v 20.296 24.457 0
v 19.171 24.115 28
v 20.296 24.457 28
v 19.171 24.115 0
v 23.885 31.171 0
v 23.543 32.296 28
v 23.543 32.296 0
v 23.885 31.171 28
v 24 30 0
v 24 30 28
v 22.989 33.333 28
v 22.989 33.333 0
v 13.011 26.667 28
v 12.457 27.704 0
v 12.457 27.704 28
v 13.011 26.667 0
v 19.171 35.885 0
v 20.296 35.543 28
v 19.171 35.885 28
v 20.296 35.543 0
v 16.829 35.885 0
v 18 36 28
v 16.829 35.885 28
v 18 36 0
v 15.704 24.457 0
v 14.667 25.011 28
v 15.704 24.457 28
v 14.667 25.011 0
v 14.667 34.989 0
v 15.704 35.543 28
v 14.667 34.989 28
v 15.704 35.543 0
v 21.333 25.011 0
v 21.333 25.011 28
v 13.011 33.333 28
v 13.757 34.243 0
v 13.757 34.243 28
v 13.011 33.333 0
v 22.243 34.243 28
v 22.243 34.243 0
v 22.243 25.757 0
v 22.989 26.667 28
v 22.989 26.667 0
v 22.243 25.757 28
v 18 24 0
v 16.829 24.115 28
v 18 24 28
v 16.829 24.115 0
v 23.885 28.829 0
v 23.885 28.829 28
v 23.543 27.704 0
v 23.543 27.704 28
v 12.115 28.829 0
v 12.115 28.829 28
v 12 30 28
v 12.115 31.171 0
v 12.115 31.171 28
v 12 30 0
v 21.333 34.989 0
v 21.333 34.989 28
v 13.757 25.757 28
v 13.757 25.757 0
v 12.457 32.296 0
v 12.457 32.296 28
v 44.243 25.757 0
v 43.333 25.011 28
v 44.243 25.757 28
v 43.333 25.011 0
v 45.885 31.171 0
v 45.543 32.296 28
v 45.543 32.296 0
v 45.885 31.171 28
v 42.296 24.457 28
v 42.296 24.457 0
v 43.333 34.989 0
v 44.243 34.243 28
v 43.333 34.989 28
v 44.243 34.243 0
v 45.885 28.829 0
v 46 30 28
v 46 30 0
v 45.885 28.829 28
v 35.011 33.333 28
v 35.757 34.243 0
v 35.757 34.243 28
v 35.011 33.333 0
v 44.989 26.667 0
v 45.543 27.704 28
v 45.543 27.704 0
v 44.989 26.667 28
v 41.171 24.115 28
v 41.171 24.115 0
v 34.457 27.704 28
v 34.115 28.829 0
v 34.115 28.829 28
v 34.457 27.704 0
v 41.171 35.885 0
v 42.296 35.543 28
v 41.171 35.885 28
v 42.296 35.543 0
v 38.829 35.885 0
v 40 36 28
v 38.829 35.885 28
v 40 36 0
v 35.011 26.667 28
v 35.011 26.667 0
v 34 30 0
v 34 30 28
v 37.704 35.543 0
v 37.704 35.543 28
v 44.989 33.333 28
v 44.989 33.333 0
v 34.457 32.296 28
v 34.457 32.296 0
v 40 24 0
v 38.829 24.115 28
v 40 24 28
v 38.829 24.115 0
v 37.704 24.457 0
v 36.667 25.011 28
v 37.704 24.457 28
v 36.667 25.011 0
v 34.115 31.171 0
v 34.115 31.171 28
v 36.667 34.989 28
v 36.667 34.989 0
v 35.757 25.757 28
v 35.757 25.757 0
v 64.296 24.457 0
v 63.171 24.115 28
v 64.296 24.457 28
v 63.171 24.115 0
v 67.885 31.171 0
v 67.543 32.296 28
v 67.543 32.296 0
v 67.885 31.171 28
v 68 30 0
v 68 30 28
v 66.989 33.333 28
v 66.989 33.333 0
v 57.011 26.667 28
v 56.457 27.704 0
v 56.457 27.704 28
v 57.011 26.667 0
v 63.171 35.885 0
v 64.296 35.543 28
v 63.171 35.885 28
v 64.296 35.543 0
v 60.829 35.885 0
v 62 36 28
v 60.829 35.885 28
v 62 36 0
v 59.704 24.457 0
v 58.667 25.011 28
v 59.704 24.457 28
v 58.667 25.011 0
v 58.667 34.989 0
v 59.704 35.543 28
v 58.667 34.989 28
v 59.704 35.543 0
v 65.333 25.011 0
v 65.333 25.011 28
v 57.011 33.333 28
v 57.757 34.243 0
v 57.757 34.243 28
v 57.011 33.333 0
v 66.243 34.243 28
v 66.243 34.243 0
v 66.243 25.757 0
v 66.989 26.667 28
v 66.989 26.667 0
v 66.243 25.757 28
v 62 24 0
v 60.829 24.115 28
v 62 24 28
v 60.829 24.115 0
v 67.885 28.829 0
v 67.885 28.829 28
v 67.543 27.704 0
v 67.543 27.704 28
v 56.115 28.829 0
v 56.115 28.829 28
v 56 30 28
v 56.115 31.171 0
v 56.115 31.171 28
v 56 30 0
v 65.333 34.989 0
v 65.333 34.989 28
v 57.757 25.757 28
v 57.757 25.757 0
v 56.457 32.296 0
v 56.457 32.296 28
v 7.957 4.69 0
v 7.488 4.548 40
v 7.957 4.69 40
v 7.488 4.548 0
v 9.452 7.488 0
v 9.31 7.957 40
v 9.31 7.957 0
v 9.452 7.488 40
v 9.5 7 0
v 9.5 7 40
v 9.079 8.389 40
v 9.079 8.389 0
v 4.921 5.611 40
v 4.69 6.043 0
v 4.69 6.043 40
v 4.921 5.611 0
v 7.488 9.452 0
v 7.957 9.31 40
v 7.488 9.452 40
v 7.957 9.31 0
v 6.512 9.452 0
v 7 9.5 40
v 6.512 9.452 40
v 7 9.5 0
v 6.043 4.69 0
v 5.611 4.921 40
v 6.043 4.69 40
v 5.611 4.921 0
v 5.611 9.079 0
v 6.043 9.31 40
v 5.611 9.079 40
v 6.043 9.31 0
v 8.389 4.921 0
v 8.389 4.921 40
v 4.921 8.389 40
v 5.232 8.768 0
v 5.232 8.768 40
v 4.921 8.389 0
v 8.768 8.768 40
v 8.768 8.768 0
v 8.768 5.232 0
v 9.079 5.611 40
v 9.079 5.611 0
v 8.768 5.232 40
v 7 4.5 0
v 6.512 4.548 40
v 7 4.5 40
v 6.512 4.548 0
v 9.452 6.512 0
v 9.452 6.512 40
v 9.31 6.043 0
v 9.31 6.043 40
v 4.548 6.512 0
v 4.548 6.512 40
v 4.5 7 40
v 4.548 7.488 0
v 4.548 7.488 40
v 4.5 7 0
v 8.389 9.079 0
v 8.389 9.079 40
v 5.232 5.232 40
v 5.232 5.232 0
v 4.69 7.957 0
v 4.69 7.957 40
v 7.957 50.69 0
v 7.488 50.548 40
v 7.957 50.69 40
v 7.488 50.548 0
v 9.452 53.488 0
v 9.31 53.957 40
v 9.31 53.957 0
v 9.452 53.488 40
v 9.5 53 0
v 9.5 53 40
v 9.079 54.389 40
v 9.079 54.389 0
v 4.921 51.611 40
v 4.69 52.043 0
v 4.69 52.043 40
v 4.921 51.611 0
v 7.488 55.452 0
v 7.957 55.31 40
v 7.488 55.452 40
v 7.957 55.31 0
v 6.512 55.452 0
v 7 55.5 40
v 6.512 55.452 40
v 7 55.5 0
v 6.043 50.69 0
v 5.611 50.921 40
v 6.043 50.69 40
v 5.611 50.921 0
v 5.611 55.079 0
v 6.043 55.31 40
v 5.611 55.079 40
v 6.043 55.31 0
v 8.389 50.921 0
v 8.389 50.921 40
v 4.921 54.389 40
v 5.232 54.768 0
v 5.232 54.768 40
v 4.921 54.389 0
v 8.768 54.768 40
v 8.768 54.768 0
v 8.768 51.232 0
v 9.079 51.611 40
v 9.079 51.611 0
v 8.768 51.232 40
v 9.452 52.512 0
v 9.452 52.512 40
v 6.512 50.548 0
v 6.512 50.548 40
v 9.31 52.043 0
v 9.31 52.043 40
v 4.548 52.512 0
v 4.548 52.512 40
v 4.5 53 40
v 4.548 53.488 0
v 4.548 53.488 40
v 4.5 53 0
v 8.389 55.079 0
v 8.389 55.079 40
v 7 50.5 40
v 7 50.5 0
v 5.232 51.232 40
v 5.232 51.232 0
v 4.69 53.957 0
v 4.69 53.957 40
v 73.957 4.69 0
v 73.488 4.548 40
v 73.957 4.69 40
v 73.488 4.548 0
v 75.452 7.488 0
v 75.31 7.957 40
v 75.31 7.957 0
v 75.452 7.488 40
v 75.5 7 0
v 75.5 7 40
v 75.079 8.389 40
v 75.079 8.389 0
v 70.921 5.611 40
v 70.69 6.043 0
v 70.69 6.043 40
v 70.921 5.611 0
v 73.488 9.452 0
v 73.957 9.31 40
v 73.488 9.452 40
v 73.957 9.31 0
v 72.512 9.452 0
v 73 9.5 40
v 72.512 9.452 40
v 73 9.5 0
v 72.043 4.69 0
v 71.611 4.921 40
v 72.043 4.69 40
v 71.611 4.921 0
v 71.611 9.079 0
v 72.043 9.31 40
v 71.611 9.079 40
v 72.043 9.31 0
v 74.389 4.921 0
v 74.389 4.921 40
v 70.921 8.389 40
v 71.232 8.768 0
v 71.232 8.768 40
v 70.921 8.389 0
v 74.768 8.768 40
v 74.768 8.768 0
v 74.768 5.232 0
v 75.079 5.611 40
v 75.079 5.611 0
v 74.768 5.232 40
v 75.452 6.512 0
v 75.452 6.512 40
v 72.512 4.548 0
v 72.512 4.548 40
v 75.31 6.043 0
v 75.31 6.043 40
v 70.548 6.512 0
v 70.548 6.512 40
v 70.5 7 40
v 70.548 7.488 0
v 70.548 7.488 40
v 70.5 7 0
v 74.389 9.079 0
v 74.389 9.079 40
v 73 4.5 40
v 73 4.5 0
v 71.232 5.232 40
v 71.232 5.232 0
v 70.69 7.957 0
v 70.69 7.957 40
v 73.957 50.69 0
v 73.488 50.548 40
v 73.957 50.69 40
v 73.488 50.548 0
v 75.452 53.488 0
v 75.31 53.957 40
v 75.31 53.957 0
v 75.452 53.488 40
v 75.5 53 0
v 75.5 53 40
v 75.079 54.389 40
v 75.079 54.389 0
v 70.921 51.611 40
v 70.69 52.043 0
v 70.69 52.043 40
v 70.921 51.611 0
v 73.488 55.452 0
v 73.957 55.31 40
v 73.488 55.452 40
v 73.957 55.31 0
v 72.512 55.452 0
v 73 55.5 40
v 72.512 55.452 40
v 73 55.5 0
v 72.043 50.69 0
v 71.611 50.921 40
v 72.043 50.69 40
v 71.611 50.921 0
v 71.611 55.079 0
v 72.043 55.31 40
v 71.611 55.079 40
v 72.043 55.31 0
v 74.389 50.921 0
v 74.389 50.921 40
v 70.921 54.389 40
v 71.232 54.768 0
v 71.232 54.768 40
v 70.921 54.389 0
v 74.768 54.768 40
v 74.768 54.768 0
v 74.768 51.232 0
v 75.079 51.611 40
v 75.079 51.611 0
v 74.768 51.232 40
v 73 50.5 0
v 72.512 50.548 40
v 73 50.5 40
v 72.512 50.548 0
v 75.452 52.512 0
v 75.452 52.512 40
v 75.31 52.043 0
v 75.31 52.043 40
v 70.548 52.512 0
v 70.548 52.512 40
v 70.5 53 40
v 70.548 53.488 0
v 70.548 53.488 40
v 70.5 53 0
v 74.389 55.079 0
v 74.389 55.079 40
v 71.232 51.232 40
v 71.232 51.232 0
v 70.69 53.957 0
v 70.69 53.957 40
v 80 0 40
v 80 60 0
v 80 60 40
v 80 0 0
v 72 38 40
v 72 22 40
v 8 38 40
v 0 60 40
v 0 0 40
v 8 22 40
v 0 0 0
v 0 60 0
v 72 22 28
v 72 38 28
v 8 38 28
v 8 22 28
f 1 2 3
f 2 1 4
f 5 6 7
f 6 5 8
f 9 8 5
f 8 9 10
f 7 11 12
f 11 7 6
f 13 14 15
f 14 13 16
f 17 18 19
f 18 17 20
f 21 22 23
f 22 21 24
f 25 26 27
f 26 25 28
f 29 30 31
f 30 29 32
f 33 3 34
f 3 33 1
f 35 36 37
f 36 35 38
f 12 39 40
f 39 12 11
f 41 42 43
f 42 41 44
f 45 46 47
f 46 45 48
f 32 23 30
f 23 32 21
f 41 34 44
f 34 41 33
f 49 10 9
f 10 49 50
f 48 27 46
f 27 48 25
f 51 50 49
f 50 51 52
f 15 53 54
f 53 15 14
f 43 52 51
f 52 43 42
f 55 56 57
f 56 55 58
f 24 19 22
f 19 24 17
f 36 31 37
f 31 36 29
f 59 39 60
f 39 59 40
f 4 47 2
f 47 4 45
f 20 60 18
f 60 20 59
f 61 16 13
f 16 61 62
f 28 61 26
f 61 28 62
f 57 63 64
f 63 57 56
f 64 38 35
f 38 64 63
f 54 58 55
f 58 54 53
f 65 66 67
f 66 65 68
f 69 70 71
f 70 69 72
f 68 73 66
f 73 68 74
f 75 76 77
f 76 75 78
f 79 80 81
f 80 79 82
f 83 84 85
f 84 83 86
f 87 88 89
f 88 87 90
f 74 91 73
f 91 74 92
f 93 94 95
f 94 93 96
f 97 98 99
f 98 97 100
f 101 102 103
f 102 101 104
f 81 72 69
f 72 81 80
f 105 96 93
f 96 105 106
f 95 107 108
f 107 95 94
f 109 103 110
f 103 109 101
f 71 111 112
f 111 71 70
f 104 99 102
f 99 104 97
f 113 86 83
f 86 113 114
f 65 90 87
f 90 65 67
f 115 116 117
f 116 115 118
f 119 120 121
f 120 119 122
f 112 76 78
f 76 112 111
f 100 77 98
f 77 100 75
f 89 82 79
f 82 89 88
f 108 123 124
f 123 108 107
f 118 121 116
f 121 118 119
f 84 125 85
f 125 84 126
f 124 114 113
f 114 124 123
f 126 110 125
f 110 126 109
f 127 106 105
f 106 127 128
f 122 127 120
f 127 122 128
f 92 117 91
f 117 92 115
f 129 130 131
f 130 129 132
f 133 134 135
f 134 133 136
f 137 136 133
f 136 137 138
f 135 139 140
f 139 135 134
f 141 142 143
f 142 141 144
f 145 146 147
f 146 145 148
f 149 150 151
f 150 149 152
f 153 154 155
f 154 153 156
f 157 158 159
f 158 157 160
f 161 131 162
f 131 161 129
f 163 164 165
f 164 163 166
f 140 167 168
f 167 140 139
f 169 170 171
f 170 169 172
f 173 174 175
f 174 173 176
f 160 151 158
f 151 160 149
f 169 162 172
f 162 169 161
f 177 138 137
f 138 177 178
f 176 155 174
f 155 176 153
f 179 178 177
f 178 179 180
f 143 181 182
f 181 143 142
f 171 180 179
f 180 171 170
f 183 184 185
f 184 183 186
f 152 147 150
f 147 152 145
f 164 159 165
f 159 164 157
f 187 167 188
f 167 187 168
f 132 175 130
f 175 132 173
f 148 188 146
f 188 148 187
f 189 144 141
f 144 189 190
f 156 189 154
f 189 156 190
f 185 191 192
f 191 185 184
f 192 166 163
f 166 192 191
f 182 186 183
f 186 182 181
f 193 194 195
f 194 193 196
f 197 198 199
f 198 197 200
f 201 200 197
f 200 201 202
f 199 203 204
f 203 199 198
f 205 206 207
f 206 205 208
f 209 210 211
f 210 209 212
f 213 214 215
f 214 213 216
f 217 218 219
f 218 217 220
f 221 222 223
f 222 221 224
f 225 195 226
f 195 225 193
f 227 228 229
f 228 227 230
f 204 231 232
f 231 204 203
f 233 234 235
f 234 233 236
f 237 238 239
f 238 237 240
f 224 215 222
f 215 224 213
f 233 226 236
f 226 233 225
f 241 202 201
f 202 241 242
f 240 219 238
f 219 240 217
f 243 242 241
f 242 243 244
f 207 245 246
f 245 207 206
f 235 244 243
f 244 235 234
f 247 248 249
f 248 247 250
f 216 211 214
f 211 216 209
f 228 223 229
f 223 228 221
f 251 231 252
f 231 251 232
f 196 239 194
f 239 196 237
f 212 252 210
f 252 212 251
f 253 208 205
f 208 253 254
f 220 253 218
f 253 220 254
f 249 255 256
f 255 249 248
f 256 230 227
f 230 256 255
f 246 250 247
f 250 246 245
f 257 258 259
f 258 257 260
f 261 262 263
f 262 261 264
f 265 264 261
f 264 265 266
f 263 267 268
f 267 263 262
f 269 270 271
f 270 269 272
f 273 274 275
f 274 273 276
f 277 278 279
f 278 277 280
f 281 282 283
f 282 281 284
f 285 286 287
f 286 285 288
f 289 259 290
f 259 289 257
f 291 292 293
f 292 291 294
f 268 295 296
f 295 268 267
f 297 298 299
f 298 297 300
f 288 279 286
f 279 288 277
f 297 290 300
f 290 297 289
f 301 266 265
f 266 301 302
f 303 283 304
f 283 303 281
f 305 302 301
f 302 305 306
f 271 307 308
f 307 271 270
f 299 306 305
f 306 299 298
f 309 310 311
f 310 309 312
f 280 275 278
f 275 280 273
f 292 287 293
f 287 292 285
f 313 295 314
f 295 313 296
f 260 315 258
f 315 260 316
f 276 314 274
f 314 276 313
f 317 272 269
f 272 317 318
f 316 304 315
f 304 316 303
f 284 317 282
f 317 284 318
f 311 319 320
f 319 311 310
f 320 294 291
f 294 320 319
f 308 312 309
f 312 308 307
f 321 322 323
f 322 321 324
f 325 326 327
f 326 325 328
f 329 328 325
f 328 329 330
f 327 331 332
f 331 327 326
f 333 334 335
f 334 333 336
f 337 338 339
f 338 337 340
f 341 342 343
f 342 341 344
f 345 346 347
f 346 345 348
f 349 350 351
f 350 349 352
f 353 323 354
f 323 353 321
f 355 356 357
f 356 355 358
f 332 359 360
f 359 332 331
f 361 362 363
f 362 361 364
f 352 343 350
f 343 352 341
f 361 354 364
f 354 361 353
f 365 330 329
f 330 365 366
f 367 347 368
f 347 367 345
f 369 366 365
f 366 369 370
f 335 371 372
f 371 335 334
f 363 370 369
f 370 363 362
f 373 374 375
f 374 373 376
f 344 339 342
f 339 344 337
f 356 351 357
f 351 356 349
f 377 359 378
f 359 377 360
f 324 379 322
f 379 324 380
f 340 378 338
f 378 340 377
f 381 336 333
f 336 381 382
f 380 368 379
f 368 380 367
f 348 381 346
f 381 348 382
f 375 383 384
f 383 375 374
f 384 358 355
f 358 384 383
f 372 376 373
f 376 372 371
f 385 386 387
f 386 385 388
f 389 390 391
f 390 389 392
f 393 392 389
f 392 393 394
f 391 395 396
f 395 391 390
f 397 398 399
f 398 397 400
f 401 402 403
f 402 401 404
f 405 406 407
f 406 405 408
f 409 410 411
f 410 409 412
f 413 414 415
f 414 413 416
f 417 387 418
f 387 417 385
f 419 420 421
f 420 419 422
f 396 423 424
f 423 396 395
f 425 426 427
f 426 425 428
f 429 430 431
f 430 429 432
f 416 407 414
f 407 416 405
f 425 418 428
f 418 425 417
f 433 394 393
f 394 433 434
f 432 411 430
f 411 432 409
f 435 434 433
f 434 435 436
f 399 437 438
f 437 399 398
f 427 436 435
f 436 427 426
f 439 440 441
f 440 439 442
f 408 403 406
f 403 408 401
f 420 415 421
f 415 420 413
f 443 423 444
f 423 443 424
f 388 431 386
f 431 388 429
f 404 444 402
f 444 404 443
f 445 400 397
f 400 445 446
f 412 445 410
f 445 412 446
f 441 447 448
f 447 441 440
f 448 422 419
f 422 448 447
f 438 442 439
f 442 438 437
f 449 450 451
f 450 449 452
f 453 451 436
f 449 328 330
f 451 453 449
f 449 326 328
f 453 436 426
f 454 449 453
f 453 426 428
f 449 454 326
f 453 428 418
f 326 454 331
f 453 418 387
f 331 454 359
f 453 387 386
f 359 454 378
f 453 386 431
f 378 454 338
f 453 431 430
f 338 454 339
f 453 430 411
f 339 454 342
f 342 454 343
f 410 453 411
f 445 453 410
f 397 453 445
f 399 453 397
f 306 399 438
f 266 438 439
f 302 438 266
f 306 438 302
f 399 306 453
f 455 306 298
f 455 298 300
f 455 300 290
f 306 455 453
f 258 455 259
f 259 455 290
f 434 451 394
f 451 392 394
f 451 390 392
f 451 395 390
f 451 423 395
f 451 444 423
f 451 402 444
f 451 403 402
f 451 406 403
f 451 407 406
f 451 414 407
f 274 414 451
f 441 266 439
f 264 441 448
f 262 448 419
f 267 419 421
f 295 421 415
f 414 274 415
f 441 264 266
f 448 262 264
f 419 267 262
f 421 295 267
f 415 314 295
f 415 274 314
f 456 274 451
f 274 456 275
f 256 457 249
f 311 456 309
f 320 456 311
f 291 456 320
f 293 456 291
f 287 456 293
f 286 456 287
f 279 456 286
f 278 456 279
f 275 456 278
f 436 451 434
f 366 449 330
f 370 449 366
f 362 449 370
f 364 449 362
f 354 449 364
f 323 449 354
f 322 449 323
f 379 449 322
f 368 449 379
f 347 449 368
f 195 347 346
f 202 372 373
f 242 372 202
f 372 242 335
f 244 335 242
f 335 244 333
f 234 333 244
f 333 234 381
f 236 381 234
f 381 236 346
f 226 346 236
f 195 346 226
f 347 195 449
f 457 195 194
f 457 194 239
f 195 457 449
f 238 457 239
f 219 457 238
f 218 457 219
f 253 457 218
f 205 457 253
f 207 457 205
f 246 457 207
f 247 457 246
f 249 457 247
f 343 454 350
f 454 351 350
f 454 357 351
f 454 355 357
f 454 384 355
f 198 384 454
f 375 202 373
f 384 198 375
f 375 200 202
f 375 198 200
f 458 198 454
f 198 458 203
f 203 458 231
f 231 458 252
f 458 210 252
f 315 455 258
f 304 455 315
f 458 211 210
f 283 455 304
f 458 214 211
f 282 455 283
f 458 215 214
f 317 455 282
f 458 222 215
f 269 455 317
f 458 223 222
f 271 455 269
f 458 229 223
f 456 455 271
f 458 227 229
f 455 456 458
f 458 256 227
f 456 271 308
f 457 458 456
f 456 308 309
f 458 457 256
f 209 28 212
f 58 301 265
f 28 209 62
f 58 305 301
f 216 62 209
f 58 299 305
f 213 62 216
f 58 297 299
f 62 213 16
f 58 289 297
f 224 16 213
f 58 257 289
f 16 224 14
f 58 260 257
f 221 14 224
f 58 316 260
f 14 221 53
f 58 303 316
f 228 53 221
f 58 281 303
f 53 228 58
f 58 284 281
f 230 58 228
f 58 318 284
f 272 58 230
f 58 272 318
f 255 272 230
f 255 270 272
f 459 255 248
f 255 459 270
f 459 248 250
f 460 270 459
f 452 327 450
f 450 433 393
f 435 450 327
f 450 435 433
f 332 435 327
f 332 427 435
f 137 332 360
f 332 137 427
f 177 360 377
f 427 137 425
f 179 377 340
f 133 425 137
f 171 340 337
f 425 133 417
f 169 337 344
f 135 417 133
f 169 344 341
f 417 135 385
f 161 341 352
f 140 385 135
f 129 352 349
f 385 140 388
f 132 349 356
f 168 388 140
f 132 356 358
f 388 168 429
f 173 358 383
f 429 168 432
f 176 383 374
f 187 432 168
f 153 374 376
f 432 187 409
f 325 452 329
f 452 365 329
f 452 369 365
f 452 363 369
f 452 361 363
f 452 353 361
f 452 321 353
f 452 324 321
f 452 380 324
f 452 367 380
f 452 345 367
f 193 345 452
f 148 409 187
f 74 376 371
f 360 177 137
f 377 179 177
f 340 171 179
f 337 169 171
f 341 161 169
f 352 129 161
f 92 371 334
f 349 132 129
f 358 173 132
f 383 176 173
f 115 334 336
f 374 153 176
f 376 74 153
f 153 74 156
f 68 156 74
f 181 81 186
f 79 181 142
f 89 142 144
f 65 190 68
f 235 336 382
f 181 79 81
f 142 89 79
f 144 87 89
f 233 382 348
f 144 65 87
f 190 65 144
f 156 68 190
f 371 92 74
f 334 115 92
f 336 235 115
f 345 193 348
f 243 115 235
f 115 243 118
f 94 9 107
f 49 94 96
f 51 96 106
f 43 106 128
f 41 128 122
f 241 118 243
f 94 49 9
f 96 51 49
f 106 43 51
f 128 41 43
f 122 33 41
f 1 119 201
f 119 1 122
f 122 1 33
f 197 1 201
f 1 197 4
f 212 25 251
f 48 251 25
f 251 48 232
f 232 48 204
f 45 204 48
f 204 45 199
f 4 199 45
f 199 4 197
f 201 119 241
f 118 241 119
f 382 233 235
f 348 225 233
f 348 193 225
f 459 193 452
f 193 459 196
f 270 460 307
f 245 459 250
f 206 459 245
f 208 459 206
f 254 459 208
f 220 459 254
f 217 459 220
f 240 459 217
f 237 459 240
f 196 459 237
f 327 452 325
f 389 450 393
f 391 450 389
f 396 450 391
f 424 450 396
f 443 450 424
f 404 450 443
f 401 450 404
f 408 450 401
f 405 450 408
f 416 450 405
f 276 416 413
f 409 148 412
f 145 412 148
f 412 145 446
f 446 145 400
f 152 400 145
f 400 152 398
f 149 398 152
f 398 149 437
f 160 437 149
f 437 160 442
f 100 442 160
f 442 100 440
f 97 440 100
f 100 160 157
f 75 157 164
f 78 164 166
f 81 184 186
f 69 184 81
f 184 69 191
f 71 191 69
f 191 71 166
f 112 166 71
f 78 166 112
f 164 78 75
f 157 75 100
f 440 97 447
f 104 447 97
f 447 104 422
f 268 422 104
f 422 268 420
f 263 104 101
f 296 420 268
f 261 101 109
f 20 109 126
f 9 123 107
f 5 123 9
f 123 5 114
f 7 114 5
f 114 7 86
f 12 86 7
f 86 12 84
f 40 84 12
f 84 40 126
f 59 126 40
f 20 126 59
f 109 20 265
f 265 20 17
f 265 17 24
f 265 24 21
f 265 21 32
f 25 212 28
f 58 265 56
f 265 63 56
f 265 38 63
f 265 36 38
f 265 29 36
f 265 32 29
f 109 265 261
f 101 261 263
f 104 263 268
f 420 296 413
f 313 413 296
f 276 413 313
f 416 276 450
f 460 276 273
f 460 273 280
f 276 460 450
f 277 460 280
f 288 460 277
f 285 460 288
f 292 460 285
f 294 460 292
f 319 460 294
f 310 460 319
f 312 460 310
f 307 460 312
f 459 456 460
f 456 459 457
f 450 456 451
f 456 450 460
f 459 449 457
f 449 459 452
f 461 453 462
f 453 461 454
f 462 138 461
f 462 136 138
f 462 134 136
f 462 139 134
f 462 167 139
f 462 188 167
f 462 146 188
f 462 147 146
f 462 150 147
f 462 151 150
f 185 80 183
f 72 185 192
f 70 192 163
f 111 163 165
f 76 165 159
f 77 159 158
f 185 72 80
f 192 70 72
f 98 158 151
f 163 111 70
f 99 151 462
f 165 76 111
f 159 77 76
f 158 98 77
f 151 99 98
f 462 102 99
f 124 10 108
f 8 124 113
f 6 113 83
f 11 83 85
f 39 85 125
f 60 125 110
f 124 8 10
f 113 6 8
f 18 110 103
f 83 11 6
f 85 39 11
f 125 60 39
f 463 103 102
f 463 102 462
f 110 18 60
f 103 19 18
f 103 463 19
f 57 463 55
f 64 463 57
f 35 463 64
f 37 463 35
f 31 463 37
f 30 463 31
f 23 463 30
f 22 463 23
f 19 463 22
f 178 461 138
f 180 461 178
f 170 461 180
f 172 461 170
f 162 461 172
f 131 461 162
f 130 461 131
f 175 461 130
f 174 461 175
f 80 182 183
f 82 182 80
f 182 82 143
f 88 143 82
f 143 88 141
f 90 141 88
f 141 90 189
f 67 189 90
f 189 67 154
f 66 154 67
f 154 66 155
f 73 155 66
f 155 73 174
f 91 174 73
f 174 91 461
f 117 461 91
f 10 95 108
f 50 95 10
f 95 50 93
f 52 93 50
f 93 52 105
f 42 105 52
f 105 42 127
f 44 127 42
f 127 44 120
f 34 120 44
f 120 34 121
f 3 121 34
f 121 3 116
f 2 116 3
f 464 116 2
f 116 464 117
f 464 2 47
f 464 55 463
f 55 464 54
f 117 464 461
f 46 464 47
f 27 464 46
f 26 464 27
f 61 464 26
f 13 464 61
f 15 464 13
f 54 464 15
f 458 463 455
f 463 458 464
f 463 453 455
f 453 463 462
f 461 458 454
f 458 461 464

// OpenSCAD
$fn = 32;

// ----------------------------------------------------------------------
// Manifold block: gallery_top manifold
// ----------------------------------------------------------------------

// --- parameters (mm) ---
block_l = 80;             // block length, X
block_w = 60;             // block width, Y
block_h = 40;             // block height, Z
port_d = 12;              // port bore diameter
port_pitch = 22;          // port pitch along X
gallery_d = 16;           // top gallery width, Y
gallery_depth = 12;       // gallery pocket depth
wall_p = 8;               // gallery end wall thickness, X
mnt_d = 5;                // mounting hole diameter
mnt_in = 7;               // mounting hole inset from the edges
fit_tol = 0.05;           // tolerance for press fits, mm
free_tol = 0.2;           // tolerance for clearance fits, mm

n_ports = 3;  // ports in the row
port_x0 = (block_l - (n_ports - 1) * port_pitch) / 2;  // first port X

difference() {
  cube([block_l, block_w, block_h]);
  for (i = [0 : n_ports - 1])
    translate([port_x0 + i * port_pitch, block_w / 2, -1])
      cylinder(h = block_h + 2, d = port_d);
  translate([wall_p, block_w / 2 - gallery_d / 2, block_h - gallery_depth])
    cube([block_l - 2 * wall_p, gallery_d, gallery_depth + 1]);
  for (cx = [mnt_in, block_l - mnt_in])
    for (cy = [mnt_in, block_w - mnt_in])
      translate([cx, cy, -1]) cylinder(h = block_h + 2, d = mnt_d);
}
